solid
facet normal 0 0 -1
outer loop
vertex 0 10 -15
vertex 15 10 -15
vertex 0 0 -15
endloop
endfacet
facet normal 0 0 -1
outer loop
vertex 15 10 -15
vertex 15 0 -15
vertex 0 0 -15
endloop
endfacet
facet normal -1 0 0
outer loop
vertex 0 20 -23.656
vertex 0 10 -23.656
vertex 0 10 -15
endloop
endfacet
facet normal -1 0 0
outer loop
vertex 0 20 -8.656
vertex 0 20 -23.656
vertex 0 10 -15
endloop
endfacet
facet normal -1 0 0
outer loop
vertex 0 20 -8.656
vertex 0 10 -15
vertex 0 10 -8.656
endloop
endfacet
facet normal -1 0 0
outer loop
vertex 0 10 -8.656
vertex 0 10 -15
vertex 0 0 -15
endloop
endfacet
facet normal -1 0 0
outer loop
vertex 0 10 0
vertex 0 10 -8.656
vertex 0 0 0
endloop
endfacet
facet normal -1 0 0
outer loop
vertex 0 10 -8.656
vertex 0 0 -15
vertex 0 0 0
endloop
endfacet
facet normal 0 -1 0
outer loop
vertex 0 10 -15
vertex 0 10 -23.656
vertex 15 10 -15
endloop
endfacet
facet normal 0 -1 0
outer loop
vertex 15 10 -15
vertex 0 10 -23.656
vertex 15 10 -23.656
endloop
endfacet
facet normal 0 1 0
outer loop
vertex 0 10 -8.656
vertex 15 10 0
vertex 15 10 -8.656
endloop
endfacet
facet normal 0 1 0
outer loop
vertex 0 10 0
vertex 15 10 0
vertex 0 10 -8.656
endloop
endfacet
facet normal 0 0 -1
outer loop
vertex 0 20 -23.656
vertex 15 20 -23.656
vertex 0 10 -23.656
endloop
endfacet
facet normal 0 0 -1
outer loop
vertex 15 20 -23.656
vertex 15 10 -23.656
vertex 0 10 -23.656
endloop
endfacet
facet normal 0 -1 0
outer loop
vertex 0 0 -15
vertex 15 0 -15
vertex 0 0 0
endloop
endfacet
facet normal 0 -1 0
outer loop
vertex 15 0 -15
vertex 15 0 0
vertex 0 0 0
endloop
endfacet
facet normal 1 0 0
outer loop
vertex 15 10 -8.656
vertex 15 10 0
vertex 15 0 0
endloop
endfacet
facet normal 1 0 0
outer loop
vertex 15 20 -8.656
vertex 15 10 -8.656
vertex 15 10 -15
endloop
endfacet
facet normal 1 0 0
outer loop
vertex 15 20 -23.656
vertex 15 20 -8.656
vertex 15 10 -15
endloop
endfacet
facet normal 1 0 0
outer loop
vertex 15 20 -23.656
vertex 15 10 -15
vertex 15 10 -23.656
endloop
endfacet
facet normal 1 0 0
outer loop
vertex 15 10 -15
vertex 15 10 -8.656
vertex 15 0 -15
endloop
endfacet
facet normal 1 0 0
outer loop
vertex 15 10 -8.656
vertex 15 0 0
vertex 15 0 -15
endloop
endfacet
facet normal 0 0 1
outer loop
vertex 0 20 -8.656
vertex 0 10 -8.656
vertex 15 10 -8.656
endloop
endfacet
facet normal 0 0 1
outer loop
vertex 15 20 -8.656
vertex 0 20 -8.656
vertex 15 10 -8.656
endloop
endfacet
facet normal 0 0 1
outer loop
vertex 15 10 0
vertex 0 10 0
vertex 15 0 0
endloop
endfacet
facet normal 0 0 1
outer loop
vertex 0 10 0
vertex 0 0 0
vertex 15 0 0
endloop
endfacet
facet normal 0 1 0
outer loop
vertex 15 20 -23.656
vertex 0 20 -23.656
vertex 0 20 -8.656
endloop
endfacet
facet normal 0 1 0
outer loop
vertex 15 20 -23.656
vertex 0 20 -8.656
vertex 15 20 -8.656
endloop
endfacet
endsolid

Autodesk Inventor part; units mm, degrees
ref_plane "YZ Plane" through (0, 0, 0) normal (1, 0, 0) x (0, 1, 0)
ref_plane "XZ Plane" through (0, 0, 0) normal (0, 1, 0) x (-1, 0, 0)
ref_plane "XY Plane" through (0, 0, 0) normal (0, 0, 1) x (1, 0, 0)
sketch "Esquisse1" plane through (0, 0, 0) normal (0, 1, 0) x (-1, 0, 0)
  line L0 (0, 0) -> (-15, 0)
  line L1 (-15, 0) -> (-15, -15)
  line L2 (-15, -15) -> (0, -15)
  line L3 (0, -15) -> (0, 0)
  dimension "d0" = 15
  dimension "d1" = 15
extrude "Extrusion1" add sketch "Esquisse1" along normal blind 10
sketch "Esquisse2" plane through (0, 10, 0) normal (0, 1, 0) x (1, 0, 0)
  line L0 (0, 15) -> (0, 0) projected
  line L1 (0, 8.6556) -> (15, 8.6556)
  line L2 (15, 8.6556) -> (15, 23.6556)
  line L3 (15, 23.6556) -> (0, 23.6556)
  line L4 (0, 23.6556) -> (0, 8.6556)
  dimension "d4" = 15
  dimension "d5" = 15
extrude "Extrusion2" add sketch "Esquisse2" along normal blind 10
